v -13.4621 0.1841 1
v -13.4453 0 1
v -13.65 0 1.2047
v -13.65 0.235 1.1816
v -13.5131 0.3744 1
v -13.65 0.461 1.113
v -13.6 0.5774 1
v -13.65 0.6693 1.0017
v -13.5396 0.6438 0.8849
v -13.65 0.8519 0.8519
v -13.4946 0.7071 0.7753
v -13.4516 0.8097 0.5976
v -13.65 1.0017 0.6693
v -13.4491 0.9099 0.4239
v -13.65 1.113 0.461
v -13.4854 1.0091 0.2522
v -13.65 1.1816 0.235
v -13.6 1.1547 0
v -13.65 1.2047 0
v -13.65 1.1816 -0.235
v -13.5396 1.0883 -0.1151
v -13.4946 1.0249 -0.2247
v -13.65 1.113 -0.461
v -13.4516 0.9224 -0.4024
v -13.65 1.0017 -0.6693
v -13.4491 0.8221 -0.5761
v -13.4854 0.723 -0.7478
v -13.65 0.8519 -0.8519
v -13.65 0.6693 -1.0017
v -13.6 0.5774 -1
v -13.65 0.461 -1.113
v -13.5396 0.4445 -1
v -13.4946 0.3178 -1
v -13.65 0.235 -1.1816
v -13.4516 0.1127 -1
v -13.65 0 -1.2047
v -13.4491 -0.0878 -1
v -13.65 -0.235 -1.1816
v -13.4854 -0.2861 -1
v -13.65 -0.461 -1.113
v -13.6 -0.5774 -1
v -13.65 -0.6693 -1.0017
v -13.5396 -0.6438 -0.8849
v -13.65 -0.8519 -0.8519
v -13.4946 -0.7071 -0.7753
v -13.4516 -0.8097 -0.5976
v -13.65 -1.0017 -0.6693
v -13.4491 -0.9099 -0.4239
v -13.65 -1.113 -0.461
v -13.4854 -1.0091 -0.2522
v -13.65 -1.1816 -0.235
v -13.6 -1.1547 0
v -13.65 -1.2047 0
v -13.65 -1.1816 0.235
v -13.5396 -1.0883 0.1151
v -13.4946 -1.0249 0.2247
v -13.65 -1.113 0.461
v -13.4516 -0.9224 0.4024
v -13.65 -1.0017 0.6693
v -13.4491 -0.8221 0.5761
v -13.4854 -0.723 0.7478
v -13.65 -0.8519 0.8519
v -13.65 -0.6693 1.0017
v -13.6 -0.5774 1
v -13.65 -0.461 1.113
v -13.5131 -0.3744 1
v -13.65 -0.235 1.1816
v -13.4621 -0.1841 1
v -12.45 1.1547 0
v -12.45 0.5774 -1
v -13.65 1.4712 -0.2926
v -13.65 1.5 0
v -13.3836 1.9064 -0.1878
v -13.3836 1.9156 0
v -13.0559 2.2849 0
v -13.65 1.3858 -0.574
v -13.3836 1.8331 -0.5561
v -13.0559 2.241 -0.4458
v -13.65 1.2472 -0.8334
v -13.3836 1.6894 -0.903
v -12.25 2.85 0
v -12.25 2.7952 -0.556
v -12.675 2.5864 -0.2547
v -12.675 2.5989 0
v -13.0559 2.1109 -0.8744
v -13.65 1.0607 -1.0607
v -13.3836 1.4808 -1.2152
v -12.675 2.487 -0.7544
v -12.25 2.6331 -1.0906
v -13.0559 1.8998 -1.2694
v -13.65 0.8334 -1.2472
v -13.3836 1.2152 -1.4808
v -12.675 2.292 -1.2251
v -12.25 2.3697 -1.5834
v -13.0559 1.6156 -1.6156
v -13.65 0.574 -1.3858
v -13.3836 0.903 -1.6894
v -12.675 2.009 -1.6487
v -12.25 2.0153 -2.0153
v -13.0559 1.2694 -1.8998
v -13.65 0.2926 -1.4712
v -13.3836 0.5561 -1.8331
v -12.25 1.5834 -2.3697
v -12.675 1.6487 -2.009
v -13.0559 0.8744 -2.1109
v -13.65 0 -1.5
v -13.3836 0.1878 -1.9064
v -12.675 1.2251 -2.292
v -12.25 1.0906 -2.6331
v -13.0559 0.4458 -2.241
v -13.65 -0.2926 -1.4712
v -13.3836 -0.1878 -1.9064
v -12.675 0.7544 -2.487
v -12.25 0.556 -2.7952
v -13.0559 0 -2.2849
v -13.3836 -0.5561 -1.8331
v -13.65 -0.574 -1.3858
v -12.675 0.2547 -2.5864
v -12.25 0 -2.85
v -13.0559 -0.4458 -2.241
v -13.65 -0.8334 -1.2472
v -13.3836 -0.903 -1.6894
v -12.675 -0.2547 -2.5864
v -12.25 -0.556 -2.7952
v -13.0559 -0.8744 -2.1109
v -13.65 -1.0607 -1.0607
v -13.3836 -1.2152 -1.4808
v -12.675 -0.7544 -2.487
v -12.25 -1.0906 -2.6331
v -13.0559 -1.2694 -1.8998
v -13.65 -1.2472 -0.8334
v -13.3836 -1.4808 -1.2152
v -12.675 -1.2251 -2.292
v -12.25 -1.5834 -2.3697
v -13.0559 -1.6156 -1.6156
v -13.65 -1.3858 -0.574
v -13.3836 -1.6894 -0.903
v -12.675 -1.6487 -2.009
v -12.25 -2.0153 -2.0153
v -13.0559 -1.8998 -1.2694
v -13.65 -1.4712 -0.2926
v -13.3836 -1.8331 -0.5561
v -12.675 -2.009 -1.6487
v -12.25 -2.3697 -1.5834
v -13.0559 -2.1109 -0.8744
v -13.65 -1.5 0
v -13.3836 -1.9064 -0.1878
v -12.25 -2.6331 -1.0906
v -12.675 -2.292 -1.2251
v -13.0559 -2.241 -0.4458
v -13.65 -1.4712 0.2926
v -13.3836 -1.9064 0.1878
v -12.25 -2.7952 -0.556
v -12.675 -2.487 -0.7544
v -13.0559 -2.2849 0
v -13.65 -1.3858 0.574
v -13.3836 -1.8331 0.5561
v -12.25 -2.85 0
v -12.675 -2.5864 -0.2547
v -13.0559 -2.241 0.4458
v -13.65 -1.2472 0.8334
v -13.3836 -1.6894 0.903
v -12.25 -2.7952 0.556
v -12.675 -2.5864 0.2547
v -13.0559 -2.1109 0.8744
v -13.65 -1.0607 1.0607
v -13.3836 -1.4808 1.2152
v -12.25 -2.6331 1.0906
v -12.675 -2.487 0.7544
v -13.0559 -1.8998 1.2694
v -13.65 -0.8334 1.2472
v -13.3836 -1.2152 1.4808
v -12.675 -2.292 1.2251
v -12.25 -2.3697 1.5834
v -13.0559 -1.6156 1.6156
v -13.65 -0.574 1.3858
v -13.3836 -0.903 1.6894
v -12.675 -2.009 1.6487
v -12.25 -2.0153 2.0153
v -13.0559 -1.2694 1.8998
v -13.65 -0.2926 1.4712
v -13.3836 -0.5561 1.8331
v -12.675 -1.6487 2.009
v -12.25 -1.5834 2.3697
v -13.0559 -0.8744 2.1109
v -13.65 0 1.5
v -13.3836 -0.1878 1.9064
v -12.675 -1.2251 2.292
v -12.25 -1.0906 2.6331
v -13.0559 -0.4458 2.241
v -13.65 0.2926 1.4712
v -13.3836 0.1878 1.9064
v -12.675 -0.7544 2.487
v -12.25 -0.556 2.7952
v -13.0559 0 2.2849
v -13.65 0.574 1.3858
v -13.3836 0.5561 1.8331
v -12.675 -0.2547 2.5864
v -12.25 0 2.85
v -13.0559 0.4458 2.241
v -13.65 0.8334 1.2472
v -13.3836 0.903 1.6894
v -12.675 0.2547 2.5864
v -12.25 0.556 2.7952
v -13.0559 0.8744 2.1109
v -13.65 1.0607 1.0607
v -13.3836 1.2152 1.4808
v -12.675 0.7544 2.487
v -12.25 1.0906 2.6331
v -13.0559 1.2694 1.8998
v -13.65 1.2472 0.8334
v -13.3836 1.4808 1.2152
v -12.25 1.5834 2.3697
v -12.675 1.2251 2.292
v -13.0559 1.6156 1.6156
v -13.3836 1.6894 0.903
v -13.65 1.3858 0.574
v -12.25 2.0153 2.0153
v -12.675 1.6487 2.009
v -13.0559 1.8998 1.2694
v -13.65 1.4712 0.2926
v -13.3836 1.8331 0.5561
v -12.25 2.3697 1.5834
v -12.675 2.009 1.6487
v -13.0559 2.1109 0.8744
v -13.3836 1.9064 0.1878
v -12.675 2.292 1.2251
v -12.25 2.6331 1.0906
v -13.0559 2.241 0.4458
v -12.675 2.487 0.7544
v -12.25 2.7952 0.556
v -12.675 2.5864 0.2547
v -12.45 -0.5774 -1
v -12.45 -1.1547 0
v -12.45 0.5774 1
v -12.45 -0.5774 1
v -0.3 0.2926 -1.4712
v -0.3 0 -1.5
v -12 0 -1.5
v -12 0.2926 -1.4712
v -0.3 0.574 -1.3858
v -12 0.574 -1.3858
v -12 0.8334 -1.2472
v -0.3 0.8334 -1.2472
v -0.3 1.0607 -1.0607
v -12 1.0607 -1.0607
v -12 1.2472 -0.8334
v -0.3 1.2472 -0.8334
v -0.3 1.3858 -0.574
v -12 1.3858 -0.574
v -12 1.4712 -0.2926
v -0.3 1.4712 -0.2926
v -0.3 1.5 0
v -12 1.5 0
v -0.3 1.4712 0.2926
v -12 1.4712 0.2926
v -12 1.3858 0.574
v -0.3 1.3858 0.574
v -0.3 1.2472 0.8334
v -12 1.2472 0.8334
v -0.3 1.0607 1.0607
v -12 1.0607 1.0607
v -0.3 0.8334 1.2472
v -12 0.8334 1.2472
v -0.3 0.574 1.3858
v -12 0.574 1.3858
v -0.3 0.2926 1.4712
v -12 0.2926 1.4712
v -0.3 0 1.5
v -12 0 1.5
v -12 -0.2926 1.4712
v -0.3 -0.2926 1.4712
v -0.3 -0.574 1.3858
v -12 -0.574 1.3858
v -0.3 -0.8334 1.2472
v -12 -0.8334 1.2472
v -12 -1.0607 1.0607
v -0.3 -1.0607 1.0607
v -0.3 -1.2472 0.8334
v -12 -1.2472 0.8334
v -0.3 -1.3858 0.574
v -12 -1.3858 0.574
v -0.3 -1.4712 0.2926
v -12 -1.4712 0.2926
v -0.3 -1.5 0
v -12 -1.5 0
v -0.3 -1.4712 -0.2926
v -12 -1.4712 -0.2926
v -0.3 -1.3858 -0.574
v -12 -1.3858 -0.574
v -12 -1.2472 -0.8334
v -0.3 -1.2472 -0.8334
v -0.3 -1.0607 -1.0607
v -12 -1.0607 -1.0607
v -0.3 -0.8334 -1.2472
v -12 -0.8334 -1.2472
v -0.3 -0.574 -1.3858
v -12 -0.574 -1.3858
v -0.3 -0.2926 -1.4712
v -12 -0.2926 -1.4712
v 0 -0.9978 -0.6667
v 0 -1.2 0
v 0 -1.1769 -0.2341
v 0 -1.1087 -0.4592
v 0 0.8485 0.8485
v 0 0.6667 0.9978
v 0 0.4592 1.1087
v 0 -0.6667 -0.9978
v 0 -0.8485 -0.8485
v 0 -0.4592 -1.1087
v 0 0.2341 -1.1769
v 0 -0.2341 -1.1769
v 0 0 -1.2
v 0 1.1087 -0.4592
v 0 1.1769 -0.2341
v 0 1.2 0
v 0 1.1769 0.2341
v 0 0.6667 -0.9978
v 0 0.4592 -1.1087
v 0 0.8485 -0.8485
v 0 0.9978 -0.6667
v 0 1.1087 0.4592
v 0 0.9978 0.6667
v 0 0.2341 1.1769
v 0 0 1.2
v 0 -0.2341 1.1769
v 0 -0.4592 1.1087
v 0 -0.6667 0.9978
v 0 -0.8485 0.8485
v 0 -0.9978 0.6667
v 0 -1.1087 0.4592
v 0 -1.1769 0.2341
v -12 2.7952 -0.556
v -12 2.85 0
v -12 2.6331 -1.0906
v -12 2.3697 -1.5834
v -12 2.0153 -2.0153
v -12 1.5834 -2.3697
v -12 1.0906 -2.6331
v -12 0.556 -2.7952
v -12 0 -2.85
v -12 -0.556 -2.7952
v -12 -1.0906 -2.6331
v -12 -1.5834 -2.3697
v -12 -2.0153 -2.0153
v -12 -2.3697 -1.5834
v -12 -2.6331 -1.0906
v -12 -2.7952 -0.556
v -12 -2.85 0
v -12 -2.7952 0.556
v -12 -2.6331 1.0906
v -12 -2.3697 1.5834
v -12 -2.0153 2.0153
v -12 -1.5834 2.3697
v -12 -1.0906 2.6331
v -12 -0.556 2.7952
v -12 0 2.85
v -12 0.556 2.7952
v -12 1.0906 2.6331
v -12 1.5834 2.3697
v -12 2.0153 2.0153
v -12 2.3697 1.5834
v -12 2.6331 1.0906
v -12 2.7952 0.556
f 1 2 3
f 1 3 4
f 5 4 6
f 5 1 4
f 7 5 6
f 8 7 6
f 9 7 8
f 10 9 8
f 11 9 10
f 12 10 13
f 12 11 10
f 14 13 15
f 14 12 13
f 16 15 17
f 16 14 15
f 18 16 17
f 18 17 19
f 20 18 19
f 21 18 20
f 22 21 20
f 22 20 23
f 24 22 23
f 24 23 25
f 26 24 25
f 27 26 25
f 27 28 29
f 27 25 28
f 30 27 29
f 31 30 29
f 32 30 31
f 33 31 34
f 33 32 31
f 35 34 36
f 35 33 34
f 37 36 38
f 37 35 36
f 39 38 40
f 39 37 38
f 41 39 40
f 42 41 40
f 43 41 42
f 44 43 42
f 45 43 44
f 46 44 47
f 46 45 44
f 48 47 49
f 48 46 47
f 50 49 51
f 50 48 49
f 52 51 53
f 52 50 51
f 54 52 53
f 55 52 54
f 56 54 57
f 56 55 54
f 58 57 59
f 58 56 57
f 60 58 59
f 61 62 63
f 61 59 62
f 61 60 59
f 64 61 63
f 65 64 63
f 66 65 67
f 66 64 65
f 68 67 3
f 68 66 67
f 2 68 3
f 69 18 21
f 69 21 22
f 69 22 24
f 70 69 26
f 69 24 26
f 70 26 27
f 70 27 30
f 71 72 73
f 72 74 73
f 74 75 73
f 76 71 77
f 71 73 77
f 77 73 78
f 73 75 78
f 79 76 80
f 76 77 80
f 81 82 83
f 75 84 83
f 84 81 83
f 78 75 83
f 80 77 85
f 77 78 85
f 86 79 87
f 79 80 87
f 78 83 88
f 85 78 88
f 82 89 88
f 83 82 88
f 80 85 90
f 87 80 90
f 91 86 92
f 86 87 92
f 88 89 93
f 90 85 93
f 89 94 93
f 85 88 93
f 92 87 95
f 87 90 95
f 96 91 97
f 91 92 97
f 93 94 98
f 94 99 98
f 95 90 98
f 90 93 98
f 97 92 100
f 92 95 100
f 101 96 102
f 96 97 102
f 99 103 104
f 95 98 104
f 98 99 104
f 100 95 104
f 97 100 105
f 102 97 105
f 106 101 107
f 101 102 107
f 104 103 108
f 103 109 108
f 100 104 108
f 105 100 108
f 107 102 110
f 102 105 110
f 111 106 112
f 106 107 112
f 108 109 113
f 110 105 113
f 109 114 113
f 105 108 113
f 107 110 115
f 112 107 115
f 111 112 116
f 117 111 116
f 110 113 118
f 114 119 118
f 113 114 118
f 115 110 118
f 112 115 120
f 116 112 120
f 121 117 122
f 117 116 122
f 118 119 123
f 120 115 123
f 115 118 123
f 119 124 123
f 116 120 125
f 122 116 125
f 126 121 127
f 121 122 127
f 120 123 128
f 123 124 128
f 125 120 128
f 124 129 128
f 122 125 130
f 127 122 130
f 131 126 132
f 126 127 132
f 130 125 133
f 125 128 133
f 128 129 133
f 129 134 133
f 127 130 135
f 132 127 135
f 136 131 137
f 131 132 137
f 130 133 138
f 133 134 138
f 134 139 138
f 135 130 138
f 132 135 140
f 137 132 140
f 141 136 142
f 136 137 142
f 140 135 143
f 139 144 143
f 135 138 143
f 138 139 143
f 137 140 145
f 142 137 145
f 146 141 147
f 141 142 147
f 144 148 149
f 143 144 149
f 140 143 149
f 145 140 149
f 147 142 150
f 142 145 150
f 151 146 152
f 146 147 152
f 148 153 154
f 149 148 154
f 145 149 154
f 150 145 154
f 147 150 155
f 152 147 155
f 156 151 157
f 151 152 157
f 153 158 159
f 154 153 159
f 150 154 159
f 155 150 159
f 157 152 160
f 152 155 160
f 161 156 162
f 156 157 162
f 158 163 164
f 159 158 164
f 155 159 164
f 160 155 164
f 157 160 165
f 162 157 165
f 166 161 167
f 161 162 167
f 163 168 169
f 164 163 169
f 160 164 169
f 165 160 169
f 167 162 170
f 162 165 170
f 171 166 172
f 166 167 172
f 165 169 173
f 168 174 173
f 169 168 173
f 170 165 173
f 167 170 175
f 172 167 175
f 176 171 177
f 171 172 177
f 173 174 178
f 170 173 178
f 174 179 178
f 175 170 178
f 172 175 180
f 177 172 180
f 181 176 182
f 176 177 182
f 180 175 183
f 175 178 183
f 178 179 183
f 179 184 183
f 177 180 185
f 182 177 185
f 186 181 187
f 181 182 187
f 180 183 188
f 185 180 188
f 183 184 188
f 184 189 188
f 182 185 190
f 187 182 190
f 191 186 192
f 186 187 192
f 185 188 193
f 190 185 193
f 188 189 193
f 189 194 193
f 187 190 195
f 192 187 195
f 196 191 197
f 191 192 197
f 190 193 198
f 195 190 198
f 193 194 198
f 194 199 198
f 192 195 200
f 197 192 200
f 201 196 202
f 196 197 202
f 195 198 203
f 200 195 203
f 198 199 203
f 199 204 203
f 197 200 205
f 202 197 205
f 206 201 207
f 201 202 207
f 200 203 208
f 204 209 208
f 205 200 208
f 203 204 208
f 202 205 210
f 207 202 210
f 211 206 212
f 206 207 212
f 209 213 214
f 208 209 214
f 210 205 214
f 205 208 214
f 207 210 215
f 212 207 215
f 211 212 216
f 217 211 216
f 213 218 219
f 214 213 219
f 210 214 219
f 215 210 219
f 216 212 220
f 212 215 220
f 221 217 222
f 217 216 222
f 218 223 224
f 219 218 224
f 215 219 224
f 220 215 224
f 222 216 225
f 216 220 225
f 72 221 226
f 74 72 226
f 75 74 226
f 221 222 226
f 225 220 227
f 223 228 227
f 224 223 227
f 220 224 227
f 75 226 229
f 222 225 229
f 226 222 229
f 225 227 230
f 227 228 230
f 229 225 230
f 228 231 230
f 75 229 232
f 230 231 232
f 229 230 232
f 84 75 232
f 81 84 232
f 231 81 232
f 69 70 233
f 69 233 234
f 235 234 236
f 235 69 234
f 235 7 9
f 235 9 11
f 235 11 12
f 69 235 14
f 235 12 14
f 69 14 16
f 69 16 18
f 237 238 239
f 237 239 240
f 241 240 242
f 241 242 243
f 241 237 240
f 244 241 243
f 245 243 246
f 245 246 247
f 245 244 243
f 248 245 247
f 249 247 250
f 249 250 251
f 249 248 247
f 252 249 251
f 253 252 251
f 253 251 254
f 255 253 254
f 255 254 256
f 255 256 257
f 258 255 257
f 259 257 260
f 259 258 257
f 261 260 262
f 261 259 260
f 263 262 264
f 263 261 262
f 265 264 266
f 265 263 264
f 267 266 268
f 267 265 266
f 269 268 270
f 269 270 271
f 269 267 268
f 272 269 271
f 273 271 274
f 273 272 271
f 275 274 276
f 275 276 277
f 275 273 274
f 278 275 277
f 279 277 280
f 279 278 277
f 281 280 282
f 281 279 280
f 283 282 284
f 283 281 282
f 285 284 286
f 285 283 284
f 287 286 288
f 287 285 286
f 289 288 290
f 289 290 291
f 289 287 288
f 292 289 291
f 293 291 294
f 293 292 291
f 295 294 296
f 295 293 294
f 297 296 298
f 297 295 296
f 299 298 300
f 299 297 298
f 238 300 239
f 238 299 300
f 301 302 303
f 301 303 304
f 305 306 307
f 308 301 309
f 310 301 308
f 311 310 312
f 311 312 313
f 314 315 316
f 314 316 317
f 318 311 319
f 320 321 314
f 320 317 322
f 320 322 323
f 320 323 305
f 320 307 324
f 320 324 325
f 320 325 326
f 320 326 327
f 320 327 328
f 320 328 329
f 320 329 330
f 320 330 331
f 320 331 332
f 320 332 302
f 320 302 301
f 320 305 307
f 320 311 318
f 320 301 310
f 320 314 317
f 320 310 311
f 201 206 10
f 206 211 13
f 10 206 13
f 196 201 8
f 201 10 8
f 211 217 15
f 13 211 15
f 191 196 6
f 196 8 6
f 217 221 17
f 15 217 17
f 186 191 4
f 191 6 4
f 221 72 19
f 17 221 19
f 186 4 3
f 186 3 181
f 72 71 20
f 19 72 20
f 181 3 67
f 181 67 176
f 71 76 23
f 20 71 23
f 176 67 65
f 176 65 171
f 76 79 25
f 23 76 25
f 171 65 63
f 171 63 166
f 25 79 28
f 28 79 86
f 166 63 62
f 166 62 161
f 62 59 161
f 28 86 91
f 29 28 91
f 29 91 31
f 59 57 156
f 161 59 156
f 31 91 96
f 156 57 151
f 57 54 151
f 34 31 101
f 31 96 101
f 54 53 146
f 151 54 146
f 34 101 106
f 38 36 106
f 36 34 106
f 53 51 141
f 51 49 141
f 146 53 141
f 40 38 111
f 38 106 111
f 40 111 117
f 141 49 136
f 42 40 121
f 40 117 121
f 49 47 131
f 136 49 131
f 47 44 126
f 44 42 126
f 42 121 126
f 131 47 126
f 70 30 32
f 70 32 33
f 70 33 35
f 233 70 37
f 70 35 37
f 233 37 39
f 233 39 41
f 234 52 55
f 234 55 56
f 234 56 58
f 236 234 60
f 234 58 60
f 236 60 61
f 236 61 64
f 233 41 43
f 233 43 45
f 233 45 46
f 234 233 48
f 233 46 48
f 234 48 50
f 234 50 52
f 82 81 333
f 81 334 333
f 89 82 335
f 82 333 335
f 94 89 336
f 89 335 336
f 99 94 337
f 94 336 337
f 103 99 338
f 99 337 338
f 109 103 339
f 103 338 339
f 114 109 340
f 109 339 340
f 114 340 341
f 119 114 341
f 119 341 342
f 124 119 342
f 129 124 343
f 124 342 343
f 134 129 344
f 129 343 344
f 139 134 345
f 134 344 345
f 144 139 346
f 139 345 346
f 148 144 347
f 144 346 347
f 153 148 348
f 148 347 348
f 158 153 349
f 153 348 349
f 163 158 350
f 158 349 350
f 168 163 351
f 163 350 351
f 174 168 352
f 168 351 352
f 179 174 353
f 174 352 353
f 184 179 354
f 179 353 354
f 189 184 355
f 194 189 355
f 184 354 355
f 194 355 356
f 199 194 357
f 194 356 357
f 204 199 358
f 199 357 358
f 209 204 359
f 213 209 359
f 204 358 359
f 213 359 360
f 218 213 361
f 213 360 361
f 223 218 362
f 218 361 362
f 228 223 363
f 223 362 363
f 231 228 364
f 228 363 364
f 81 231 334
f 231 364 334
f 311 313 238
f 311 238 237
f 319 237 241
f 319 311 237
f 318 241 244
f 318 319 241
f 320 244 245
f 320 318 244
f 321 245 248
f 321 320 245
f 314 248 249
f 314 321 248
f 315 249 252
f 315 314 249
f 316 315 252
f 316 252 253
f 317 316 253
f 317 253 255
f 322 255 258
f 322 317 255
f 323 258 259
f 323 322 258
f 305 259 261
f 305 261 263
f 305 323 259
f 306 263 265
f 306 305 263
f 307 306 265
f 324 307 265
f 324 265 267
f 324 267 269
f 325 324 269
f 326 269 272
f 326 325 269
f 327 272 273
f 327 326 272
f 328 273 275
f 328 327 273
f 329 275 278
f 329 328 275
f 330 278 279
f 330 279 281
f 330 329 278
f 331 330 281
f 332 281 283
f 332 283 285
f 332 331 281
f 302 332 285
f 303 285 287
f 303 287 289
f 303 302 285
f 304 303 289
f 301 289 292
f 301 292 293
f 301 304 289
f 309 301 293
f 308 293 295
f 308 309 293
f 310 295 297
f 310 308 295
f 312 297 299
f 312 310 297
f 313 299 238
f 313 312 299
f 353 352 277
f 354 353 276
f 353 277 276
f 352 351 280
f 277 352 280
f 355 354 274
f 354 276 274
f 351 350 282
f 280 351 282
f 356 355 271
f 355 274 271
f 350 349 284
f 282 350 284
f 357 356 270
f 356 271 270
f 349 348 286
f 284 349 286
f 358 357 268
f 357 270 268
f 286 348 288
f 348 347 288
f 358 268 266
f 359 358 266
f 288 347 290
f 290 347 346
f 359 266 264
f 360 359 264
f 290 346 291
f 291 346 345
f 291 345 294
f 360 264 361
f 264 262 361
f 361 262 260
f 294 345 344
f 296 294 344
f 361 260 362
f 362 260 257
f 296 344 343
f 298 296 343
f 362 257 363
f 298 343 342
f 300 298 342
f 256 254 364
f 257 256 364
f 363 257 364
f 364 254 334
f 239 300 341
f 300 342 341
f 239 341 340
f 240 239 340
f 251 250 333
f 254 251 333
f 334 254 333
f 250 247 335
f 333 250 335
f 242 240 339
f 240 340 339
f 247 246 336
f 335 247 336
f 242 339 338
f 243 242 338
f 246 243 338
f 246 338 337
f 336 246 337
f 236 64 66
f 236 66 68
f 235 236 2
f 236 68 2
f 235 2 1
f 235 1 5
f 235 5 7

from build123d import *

# Parameters (mm, degrees)
SKETCH2_R           = 1.5
BOSS_EXTRUDE1_DEPTH = 12
CHAMFER1_SIZE       = 0.3
CUT_EXTRUDE1_DEPTH  = 1.2
SKETCH8_R           = 1.204700538
CUT_EXTRUDE2_DEPTH  = 1
CUT_EXTRUDE2_TAPER  = 45


with BuildPart() as part:
    # Sketch2 → Boss-Extrude1 (new body)
    with BuildSketch(Plane(origin=(0, 0, 0), x_dir=(0, 0, -1), z_dir=(1, 0, 0))):
        Circle(SKETCH2_R)
    extrude(amount=-BOSS_EXTRUDE1_DEPTH)

    # Chamfer1
    chamfer1_edges = [part.edges().sort_by_distance(p)[0] for p in [
        (0, 0, 1.5),
    ]]
    chamfer(chamfer1_edges, length=CHAMFER1_SIZE)

    # Sketch6 → Revolve1 (revolve)
    with BuildSketch(Plane.XY):
        with BuildLine():
            Line((-13.65, 0), (-13.65, 1.5))
            ThreePointArc((-13.65, 1.5), (-13.055944823, 2.284868705), (-12.25, 2.85))
            Line((-12.25, 2.85), (-12, 2.85))
            Line((-12, 2.85), (-12, 0))
            Line((-12, 0), (-13.65, 0))
        make_face()
    revolve(axis=Axis((-12, 0, 0), (-1, 0, 0)))

    # Sketch7 → Cut-Extrude1 (cut)
    with BuildSketch(Plane.ZY.offset(13.65)):
        Polygon((0, 1.154700538), (-1, 0.577350269), (-1, -0.577350269), (0, -1.154700538), (1, -0.577350269), (1, 0.577350269), align=None)
    extrude(amount=-CUT_EXTRUDE1_DEPTH, mode=Mode.SUBTRACT)

    # Sketch8 → Cut-Extrude2 (cut)
    with BuildSketch(Plane.ZY.offset(13.65)):
        Circle(SKETCH8_R)
    extrude(amount=-CUT_EXTRUDE2_DEPTH, taper=CUT_EXTRUDE2_TAPER, mode=Mode.SUBTRACT)


solid = part.part
